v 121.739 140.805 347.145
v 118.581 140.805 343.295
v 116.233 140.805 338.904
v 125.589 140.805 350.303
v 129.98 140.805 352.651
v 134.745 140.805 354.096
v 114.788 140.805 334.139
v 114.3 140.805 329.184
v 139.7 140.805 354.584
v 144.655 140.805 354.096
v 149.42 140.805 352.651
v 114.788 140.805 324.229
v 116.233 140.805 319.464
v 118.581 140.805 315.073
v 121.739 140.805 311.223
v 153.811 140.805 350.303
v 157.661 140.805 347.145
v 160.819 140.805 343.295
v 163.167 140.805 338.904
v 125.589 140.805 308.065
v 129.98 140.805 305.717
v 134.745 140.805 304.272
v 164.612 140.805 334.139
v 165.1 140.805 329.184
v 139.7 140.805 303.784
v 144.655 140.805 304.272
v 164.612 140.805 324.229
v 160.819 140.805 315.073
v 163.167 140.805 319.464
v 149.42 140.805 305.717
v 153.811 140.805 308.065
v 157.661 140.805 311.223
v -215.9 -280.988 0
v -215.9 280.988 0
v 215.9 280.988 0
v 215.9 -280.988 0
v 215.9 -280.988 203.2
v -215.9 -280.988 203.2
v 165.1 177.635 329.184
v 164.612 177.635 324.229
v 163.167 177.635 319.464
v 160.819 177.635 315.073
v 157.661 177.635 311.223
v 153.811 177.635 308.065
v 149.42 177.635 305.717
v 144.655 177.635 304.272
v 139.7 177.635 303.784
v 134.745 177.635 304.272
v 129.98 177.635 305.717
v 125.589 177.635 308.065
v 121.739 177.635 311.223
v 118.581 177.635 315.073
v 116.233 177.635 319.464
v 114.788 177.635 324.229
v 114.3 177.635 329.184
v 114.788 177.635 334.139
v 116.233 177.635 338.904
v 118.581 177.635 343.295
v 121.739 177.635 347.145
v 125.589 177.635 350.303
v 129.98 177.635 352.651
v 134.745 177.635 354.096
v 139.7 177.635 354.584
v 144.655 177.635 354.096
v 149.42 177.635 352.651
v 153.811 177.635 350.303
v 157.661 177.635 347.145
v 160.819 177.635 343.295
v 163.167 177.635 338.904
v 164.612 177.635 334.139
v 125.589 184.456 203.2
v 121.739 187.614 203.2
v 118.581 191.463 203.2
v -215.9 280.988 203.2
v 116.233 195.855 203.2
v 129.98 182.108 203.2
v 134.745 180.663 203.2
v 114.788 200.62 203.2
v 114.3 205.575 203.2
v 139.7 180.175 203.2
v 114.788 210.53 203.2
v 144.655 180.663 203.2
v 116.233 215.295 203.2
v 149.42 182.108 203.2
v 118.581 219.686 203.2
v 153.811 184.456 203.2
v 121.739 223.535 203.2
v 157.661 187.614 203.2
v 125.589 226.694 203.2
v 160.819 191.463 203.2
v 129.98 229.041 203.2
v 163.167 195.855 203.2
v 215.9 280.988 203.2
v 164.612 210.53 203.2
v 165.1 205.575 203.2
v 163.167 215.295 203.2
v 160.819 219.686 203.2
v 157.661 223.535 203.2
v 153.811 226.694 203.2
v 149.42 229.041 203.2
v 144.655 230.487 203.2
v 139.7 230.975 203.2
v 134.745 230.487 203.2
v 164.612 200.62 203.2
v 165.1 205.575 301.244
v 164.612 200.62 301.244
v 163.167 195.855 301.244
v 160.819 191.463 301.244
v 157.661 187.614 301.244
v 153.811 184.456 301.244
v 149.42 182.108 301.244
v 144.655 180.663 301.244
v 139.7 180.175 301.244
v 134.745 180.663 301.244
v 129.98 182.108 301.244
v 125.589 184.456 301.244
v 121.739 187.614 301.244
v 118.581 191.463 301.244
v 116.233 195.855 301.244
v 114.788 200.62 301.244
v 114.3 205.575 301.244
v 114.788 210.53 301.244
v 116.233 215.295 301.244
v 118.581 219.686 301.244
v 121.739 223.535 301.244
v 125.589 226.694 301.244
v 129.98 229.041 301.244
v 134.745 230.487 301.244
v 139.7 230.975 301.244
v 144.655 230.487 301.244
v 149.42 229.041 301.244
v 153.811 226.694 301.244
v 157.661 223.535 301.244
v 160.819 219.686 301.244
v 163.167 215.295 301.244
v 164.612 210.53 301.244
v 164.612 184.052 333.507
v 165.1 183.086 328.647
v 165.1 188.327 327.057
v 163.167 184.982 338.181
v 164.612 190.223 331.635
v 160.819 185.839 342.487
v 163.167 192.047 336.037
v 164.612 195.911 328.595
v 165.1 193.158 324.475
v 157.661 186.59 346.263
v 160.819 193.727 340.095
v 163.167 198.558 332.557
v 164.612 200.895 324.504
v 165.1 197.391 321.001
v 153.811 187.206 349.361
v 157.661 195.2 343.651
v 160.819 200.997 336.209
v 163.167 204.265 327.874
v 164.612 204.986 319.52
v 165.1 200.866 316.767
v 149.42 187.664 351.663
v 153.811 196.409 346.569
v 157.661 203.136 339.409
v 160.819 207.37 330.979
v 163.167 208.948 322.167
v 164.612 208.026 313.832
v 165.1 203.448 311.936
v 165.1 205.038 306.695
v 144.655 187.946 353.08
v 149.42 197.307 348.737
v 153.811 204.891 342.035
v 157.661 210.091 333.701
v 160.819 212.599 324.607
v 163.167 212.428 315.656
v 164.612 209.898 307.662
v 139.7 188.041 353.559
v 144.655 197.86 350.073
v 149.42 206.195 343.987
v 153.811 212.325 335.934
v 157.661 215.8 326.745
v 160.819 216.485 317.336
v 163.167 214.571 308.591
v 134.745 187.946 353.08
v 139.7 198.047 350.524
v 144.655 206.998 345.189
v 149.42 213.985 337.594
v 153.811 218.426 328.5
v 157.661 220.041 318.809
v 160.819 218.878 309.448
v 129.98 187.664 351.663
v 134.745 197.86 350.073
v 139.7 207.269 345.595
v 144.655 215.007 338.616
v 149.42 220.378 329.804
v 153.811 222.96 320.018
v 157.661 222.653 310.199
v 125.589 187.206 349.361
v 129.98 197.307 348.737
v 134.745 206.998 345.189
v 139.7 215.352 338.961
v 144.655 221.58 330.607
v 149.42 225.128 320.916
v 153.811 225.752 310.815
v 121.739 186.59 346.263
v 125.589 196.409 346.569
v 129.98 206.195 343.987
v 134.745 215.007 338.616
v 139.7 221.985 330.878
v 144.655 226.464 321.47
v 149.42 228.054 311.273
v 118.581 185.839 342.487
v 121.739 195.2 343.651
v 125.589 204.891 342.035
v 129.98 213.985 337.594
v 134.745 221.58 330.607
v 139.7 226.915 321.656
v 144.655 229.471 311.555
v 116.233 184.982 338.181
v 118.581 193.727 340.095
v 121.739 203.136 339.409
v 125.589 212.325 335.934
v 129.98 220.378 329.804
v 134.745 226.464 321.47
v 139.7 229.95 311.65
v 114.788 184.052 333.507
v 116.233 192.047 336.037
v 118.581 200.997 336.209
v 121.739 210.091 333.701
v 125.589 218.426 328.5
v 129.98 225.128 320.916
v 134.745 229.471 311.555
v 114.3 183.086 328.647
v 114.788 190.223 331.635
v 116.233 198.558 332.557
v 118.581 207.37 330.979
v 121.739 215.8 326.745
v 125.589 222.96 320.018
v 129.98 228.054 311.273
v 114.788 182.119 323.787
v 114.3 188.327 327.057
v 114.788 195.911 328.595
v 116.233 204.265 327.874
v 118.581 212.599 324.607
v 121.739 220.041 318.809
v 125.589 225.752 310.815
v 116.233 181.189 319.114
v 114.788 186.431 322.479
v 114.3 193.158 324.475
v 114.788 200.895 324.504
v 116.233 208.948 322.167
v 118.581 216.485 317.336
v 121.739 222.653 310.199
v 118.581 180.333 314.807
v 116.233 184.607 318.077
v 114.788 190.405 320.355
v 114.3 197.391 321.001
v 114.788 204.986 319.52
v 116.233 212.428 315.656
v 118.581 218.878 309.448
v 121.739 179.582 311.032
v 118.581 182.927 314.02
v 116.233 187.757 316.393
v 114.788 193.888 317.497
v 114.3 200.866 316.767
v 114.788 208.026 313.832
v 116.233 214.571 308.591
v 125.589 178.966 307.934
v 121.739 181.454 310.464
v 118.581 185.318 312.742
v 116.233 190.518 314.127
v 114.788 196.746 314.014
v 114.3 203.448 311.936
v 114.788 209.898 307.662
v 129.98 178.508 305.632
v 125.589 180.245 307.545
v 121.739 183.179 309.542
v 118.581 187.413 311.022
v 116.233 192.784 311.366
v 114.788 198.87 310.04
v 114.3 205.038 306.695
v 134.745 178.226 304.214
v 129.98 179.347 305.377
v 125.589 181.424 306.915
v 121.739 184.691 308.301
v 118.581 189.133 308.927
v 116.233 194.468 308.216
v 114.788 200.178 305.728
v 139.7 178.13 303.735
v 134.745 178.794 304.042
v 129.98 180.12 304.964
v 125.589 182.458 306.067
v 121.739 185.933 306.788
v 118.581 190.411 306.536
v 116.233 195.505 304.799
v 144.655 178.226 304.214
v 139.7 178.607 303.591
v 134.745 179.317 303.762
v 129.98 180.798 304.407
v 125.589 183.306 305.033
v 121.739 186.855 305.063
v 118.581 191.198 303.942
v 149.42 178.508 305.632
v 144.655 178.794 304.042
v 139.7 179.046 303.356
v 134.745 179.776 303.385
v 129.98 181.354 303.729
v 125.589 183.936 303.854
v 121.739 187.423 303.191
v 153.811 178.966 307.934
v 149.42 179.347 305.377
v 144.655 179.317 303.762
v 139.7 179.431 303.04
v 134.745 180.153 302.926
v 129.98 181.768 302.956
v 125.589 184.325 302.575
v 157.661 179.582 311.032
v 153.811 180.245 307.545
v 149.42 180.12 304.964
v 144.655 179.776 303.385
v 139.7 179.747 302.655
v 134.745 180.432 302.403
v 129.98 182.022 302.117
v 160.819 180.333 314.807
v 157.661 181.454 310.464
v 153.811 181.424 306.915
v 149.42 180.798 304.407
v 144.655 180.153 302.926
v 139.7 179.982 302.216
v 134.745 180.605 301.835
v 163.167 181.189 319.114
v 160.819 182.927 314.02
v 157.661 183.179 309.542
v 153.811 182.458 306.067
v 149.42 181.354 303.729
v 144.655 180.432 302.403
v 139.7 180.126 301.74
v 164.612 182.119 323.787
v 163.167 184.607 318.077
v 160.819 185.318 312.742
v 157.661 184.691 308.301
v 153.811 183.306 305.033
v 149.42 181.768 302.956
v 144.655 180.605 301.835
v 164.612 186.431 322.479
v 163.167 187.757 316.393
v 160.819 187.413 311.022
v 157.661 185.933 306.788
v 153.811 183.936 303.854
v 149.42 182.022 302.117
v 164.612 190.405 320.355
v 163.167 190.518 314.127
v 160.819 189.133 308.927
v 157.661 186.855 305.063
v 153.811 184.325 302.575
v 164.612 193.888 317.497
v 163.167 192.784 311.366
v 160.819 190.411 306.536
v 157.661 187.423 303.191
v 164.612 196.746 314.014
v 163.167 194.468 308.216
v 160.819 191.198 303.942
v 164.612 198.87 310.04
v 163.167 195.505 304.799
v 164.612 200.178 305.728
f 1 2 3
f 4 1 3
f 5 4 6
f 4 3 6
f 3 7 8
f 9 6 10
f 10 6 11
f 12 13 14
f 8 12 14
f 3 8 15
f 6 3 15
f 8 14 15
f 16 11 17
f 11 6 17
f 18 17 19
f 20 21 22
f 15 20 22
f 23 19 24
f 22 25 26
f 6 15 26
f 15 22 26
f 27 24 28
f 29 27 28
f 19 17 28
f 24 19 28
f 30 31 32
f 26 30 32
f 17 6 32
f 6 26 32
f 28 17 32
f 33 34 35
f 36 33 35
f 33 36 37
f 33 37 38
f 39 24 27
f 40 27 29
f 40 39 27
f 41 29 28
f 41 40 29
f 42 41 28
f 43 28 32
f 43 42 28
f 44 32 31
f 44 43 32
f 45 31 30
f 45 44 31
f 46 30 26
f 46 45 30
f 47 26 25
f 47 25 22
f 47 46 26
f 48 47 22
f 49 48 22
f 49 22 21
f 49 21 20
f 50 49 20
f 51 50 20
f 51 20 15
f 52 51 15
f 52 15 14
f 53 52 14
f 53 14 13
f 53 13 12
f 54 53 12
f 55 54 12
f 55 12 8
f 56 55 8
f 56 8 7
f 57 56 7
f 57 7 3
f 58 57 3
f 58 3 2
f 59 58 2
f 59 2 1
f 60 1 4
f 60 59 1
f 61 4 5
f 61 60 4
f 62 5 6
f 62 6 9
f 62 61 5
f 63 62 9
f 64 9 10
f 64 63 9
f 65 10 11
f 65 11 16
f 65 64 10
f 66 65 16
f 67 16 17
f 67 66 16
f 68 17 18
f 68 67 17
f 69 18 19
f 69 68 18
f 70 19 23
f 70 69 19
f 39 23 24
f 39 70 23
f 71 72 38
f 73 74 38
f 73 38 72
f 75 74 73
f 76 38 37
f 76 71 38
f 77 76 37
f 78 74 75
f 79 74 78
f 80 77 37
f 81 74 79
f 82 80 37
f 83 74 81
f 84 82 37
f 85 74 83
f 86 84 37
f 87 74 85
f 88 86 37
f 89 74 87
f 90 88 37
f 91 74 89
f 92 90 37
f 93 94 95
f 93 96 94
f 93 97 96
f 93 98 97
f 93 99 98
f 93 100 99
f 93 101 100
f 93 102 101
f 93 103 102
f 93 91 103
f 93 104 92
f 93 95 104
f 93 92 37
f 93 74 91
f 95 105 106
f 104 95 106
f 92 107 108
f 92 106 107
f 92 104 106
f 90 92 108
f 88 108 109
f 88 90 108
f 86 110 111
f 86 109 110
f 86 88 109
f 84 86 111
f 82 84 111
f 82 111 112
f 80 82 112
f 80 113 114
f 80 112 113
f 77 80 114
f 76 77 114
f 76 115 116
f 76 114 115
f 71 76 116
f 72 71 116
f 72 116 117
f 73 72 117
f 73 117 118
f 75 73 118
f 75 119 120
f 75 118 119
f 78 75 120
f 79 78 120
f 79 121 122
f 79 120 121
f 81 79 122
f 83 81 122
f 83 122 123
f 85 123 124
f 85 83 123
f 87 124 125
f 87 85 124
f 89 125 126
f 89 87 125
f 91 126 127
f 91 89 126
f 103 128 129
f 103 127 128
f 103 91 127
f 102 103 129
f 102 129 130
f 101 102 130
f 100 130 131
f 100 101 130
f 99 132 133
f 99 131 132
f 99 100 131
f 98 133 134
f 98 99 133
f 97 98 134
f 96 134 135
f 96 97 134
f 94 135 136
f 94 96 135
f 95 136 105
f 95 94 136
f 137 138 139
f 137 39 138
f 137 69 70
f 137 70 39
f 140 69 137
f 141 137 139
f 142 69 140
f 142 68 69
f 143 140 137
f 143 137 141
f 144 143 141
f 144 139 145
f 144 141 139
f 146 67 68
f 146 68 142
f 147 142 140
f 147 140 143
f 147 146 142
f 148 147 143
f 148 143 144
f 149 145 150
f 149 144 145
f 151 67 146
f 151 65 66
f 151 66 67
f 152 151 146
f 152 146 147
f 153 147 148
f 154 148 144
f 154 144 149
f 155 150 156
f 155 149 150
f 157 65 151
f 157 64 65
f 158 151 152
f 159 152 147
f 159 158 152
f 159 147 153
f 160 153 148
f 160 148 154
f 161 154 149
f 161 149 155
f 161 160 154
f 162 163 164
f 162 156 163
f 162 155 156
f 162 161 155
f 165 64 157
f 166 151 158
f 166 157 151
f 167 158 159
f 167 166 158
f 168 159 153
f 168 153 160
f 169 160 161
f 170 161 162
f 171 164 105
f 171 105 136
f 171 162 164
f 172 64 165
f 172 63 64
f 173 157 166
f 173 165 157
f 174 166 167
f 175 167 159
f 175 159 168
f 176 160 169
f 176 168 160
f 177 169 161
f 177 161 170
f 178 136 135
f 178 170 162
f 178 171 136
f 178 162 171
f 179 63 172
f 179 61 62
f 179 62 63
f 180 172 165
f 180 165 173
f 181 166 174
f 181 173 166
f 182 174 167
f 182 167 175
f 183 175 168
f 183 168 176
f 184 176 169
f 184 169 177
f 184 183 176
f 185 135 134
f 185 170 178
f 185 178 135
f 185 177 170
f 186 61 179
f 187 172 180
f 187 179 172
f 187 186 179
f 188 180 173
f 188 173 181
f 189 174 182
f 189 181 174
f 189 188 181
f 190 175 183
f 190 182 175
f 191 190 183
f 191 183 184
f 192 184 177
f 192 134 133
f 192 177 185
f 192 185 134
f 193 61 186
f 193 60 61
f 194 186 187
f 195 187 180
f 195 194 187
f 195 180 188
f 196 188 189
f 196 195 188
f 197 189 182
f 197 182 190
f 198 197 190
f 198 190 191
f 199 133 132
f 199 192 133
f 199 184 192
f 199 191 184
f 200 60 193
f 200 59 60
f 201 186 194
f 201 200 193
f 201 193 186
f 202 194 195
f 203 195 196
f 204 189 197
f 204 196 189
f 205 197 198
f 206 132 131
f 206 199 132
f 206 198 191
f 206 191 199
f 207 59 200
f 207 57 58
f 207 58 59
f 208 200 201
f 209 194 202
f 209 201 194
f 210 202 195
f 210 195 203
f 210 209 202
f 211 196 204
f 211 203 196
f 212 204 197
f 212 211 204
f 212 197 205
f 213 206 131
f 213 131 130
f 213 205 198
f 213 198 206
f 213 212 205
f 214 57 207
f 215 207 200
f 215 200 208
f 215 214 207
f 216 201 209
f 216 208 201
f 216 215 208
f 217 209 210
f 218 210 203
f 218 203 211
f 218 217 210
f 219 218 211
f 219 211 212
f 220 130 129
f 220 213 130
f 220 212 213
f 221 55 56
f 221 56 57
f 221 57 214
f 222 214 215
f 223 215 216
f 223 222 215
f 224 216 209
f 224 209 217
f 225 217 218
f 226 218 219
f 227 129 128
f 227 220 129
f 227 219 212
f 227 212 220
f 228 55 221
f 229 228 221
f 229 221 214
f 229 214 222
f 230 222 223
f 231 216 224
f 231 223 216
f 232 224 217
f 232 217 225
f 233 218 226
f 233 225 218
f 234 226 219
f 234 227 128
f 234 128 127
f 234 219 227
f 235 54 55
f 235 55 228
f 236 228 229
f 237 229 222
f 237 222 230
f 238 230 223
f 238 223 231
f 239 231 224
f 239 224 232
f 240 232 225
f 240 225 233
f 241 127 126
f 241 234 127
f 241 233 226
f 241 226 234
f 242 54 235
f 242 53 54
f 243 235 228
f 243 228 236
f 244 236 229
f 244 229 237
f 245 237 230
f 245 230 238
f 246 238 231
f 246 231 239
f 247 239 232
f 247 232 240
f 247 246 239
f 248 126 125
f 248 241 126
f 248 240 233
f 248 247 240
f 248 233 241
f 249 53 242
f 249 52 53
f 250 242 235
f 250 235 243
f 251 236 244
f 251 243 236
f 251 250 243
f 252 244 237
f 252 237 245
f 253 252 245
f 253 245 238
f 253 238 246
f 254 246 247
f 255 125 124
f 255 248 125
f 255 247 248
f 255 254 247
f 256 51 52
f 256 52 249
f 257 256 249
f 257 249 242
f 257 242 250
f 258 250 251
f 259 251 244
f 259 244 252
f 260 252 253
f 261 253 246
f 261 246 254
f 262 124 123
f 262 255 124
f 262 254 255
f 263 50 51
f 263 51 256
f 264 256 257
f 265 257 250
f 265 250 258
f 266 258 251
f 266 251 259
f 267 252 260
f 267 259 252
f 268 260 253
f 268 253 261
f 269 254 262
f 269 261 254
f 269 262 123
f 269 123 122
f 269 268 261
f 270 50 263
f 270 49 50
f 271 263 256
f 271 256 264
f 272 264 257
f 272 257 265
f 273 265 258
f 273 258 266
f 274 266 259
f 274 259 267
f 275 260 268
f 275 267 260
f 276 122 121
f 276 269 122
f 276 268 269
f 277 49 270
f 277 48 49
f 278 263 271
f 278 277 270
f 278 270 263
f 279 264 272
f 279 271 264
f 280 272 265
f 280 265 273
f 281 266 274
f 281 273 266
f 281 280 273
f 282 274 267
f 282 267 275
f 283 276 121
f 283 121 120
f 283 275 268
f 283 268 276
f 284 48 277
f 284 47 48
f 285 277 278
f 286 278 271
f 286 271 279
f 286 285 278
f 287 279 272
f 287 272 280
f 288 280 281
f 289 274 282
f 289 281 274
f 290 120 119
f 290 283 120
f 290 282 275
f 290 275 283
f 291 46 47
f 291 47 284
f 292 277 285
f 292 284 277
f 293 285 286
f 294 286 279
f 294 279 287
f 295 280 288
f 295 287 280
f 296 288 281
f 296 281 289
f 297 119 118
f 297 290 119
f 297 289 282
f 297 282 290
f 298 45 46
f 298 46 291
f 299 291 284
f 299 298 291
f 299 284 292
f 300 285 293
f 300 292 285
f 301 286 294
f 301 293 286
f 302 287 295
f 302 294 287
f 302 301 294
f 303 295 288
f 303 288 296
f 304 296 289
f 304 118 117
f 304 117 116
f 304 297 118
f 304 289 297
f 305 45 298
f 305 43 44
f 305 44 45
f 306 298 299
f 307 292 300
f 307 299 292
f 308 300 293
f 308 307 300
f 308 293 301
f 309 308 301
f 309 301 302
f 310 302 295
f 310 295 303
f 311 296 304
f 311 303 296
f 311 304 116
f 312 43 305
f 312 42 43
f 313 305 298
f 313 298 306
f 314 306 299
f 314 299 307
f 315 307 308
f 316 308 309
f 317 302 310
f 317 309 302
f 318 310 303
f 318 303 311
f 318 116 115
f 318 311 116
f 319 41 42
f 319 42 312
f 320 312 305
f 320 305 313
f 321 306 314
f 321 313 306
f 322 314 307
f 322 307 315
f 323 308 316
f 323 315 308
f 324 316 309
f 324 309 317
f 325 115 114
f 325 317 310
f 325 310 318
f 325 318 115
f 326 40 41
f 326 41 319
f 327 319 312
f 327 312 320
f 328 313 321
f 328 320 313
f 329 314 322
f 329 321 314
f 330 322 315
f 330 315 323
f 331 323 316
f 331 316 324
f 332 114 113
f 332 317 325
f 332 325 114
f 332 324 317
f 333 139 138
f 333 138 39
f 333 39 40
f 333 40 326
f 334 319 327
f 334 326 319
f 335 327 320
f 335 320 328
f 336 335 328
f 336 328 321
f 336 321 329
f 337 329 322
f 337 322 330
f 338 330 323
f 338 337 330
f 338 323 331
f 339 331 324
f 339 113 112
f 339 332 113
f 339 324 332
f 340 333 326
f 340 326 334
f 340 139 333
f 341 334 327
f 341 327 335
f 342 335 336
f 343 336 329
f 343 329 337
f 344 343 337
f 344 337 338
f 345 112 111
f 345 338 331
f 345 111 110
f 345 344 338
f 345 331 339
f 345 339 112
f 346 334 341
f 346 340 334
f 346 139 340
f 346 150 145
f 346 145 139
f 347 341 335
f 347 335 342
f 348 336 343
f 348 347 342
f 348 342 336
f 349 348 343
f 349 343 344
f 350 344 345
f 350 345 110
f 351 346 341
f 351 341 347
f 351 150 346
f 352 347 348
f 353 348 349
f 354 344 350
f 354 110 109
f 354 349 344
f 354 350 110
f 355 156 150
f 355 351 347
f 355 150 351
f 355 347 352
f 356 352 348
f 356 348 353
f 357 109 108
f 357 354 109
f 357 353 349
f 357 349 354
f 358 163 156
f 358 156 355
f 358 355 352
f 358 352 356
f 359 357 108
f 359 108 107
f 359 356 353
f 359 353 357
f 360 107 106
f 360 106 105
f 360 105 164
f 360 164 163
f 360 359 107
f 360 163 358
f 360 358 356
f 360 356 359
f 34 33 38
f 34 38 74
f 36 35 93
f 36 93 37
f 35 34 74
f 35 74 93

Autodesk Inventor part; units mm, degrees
ref_plane "YZ Plane" through (0, 0, 0) normal (1, 0, 0) x (0, 1, 0)
sketch "Sketch1" plane through (0, 0, 0) normal (0, 0, 1) x (1, 0, 0)
  line L0 (215.9, -280.9875) -> (-215.9, -280.9875)
  line L1 (-215.9, -280.9875) -> (-215.9, 280.9875)
  line L2 (-215.9, 280.9875) -> (215.9, 280.9875)
  line L3 (215.9, 280.9875) -> (215.9, -280.9875)
  line L4 (215.9, -280.9875) -> (-215.9, 280.9875) construction
  line L5 (-215.9, -280.9875) -> (215.9, 280.9875) construction
  point P0 (0, 0)
  dimension "d0" = 431.8
  dimension "d1" = 561.975
extrude "Extrusion1" add sketch "Sketch1" along normal blind 203.2
sketch "Sketch2" plane through (0, 0, 203.2) normal (0, 0, 1) x (1, 0, 0)
  circle A0 centre (139.7, 205.5749) radius 25.4
  line L0 (-215.9, -280.9875) -> (215.9, -280.9875) projected
  line L1 (215.9, -280.9875) -> (215.9, 280.9875) projected
  point P0 (0, 0)
  dimension "d4" = 50.8
  dimension "d5" = 486.5624
  dimension "d6" = 76.2
extrude "Extrusion2" add sketch "Sketch2" along normal blind 98.044
ref_plane "Work Plane1" through (-215.9, 177.6349, 0) normal (0, 1, 0) x (1, 0, 0)
sketch "Sketch3" plane through (-215.9, 177.6349, 0) normal (0, 1, 0) x (1, 0, 0)
  circle A0 centre (355.6, -329.184) radius 25.4
  line L0 (330.2, -301.244) -> (381, -301.244) projected
  point P0 (215.9, 0)
  dimension "d16" = 27.94
extrude "Extrusion3" add sketch "Sketch3" against normal blind 36.83
ref_plane "Work Plane2" through (139.7, -280.9875, 0) normal (1, 0, 0) x (0, 0, -1)
sketch "Sketch5" plane through (0, 0, 301.244) normal (0, 0, 1) x (1, 0, 0)
  circle A0 centre (139.7, 205.5749) radius 25.4 projected
  circle A1 centre (139.7, 205.5749) radius 25.4
  line L0 (165.1, 177.6349) -> (114.3, 177.6349) projected
  line L1 (114.3, 177.6349) -> (165.1, 177.6349)
  point P0 (0, 0)
revolve "Revolution1" add sketch "Sketch5" angle 90 about axis through (165.1, 177.6349, 301.244) along (1, 0, 0)
properties part number "Sump_1SDB_Tub"
